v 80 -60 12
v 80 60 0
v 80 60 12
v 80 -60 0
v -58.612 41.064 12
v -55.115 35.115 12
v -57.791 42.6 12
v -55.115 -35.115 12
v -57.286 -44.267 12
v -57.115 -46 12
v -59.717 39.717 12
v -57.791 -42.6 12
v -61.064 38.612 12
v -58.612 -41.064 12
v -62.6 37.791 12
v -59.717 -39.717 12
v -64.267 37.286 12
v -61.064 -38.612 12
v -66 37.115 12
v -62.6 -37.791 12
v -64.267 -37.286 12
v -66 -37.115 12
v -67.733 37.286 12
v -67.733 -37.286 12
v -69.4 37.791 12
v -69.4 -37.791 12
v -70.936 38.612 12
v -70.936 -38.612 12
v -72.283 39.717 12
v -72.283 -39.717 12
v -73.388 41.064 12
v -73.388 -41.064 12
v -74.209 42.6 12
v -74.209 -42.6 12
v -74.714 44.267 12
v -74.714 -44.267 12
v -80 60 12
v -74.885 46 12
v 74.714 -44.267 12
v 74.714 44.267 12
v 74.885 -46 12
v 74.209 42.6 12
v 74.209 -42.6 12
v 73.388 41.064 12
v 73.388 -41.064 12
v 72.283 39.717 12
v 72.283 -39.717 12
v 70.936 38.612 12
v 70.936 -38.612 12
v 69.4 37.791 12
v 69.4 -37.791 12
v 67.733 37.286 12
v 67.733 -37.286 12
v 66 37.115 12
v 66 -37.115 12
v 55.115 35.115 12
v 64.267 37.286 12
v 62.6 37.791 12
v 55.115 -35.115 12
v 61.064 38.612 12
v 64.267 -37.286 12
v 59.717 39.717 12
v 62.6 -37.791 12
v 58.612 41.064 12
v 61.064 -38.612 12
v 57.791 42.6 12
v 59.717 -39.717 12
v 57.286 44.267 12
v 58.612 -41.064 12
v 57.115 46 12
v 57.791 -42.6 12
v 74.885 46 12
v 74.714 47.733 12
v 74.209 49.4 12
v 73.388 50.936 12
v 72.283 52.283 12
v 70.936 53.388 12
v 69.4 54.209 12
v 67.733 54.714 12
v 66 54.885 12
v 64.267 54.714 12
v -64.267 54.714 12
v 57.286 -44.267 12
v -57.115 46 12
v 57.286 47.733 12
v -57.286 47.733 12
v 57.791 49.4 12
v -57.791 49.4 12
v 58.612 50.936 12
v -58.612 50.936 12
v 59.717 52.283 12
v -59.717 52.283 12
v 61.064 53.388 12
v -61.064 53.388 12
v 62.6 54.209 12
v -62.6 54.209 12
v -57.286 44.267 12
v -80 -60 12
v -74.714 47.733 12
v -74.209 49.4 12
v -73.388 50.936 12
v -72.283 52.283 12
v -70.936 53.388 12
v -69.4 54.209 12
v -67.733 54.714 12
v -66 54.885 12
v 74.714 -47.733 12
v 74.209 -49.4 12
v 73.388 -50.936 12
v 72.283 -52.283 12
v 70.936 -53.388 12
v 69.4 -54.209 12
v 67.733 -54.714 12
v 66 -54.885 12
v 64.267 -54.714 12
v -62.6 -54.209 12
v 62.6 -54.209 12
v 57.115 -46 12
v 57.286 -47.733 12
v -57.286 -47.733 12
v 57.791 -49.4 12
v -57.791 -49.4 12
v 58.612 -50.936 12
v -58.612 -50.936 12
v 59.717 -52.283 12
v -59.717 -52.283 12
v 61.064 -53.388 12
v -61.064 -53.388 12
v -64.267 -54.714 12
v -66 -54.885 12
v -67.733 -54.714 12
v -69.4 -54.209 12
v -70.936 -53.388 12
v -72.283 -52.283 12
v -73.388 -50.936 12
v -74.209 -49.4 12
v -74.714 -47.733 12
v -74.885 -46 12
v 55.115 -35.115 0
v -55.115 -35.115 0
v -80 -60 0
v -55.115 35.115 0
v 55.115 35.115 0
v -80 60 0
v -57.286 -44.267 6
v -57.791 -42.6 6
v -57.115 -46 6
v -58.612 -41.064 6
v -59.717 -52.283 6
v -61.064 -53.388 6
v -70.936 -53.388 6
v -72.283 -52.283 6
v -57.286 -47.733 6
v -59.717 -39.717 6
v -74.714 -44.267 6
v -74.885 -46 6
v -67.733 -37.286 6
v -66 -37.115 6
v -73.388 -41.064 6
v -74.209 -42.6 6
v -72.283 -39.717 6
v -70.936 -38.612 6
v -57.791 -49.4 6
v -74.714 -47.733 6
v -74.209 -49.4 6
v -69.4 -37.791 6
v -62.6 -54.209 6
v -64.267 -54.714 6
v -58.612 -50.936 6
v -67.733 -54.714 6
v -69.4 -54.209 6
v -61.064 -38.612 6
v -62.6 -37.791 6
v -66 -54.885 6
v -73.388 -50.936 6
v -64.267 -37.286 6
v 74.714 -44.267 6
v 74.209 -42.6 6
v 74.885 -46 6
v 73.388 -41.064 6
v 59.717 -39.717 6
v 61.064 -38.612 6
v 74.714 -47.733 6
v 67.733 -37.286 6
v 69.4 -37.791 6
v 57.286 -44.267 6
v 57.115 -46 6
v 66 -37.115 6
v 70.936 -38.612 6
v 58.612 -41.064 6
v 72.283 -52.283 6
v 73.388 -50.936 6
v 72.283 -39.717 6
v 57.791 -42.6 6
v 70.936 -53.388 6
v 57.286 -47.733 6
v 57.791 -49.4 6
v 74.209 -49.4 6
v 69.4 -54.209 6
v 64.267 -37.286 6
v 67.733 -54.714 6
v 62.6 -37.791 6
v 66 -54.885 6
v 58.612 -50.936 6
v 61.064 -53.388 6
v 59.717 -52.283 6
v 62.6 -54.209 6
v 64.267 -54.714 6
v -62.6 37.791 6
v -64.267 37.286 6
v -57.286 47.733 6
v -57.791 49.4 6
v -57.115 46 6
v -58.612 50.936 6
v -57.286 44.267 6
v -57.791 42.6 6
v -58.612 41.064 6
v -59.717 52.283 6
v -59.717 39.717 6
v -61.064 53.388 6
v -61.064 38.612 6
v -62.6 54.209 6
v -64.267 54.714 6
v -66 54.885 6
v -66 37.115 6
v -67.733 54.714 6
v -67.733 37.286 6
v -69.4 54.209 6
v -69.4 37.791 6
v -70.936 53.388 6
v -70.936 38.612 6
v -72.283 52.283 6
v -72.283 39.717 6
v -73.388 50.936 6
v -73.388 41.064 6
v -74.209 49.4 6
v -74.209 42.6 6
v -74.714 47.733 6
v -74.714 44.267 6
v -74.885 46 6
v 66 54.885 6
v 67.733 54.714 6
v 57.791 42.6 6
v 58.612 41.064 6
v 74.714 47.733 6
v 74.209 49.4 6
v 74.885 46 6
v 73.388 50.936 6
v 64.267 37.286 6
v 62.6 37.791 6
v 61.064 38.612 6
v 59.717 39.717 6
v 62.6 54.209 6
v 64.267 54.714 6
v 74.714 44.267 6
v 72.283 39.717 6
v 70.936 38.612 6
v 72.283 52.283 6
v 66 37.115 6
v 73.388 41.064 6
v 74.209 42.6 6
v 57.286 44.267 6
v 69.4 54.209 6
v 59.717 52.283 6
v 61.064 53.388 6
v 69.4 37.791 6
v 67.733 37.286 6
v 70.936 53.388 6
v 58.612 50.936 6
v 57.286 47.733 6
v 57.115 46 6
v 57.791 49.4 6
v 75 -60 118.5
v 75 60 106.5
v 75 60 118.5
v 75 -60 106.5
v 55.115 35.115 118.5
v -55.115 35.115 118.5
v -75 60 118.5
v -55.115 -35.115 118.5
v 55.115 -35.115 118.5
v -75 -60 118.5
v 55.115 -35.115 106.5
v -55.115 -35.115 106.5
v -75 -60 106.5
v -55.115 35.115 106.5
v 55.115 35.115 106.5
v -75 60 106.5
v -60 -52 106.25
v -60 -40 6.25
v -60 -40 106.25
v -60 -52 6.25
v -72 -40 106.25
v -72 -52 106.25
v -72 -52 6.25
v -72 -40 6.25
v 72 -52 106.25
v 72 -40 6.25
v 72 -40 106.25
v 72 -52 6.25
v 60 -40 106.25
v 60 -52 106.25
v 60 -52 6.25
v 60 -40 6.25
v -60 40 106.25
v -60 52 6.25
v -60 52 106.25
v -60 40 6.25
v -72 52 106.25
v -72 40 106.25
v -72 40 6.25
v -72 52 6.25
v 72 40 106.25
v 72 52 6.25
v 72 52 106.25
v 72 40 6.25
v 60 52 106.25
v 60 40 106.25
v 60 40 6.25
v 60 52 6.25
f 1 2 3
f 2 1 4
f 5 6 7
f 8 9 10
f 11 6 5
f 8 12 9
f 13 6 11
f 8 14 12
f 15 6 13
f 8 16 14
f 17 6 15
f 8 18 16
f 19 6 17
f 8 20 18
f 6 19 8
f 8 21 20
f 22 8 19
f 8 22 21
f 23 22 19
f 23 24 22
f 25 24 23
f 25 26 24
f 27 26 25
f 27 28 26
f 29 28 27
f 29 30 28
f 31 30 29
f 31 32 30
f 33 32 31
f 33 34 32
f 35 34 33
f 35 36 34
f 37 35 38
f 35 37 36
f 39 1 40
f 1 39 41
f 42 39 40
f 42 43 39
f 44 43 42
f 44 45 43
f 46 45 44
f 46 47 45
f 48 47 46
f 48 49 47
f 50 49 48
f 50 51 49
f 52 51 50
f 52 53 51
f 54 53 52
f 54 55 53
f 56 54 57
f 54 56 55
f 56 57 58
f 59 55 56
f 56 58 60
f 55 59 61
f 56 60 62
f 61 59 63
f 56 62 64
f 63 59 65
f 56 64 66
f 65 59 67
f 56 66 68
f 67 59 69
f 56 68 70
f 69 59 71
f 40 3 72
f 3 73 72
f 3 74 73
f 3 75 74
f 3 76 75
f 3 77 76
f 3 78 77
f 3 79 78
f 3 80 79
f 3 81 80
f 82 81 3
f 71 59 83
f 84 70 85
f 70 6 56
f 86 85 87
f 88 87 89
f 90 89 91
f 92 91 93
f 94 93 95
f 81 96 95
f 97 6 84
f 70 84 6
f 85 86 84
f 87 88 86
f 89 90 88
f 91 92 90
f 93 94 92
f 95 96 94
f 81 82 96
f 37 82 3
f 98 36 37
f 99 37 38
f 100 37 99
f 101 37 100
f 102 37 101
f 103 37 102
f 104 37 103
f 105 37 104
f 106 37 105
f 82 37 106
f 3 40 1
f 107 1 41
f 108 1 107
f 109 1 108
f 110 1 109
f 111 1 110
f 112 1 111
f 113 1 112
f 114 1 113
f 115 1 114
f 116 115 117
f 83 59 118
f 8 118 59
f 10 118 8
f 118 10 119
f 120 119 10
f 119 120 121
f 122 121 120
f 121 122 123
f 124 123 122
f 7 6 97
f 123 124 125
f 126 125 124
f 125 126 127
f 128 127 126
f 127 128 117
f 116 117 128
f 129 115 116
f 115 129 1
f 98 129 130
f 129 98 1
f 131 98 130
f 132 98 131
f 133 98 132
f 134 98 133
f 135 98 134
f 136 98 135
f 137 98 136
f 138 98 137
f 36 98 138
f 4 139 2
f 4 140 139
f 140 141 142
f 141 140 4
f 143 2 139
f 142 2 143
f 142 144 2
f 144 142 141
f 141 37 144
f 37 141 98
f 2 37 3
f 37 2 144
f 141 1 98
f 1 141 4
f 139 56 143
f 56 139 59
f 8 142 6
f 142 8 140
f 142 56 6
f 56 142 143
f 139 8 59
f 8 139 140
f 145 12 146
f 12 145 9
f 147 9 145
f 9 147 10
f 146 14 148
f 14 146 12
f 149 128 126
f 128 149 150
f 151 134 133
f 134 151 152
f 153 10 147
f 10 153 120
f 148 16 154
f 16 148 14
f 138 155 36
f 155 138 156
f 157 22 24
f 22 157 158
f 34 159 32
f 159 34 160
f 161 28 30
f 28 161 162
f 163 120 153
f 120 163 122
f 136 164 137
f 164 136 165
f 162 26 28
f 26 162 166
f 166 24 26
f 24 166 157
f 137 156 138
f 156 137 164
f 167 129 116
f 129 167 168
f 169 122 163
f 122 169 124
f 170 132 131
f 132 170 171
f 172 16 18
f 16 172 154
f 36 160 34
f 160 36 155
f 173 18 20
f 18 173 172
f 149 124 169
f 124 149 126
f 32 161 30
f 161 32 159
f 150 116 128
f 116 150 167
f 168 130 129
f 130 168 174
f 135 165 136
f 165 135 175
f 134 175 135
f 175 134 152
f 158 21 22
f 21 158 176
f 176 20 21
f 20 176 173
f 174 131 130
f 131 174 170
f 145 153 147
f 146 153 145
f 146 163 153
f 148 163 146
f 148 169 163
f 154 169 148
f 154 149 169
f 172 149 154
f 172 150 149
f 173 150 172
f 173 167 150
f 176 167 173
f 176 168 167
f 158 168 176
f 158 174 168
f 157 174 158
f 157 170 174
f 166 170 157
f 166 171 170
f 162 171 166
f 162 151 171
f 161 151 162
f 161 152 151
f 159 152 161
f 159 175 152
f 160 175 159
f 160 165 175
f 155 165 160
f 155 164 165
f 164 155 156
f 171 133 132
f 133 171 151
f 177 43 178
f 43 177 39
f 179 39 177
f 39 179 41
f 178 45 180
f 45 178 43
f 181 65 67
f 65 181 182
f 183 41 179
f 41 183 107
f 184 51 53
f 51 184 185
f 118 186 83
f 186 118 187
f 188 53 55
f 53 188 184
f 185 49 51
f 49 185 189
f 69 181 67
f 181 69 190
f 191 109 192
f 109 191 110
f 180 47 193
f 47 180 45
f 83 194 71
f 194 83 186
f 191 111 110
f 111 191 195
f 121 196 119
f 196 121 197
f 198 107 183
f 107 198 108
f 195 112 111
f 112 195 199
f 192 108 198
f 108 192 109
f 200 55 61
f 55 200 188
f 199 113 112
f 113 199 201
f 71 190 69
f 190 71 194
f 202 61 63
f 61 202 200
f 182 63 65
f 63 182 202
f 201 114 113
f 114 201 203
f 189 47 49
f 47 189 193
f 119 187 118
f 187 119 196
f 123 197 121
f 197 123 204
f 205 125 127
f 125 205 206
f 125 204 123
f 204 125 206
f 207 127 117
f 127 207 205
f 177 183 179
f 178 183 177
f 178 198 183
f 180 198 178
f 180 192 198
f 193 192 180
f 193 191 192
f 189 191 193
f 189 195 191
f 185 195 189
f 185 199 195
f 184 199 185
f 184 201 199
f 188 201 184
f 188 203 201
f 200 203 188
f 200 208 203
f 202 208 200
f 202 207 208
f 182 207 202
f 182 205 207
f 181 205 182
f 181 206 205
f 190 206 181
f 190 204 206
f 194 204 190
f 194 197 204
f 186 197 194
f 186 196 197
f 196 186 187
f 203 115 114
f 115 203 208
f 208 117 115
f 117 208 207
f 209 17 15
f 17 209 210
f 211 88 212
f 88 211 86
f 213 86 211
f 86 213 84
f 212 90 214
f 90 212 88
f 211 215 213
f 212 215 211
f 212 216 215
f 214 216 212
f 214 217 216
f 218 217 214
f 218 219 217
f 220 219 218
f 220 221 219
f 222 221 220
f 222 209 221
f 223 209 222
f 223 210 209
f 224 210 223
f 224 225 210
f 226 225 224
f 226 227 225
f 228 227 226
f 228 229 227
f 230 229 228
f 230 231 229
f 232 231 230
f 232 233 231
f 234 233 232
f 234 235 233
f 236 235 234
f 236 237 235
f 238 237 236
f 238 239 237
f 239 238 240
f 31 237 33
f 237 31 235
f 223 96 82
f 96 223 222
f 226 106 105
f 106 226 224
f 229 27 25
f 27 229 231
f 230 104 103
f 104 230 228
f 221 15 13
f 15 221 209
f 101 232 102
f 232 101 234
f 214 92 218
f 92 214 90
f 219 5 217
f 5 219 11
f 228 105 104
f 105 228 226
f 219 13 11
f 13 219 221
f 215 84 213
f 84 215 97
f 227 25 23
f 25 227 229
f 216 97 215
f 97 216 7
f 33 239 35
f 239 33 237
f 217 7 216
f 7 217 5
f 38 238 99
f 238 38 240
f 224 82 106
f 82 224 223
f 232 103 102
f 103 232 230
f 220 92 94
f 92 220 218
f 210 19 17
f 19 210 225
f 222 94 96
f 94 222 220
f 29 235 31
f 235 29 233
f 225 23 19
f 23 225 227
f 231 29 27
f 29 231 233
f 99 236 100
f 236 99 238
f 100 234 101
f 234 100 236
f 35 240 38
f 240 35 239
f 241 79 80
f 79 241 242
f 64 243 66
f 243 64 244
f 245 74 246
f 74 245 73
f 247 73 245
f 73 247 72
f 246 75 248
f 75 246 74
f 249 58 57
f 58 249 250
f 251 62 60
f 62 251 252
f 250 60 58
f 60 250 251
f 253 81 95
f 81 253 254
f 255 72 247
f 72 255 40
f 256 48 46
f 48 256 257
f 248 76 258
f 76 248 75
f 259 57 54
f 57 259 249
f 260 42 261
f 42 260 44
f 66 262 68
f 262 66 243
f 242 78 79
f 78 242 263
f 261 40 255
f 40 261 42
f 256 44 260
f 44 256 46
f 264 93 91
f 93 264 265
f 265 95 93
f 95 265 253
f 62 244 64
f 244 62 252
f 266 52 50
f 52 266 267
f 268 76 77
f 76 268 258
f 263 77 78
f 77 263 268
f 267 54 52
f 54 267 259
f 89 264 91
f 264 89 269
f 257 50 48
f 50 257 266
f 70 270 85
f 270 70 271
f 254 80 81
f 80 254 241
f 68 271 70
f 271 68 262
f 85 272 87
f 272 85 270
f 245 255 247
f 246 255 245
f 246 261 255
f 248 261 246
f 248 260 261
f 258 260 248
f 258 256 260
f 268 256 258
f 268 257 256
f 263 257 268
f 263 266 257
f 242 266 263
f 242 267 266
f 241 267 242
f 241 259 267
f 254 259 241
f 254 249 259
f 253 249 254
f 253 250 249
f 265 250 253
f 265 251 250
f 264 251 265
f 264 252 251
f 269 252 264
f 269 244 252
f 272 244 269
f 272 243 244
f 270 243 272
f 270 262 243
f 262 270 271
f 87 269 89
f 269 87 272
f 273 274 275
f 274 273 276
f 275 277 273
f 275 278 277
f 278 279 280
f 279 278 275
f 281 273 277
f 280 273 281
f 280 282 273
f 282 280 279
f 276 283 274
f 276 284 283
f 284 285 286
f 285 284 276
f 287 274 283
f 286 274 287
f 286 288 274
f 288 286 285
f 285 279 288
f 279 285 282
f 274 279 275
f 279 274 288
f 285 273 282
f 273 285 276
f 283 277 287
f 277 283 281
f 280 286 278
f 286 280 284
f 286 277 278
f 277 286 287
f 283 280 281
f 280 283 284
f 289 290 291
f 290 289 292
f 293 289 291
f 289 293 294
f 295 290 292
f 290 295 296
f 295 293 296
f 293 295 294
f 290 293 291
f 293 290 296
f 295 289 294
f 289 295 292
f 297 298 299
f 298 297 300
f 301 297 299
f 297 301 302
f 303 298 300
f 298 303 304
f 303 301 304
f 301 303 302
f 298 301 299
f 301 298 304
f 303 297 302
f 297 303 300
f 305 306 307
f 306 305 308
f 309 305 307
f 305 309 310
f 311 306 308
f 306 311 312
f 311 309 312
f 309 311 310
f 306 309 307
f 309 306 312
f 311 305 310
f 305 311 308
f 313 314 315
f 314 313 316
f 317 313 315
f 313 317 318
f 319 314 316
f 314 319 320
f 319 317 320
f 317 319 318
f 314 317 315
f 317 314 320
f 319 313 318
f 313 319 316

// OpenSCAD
$fn = 32;

// ------------------------------------------------------------------------
// Frame cube: base 160 x 120 mm, posts 100 mm tall
// Every part is its own module, assembly() places every instance.
// ------------------------------------------------------------------------

// --- part 1 ---
module base_frame() {
  difference() {
    translate([-80, -60, 0]) cube([160, 120, 12]);
    translate([-55.115, -35.115, -1]) cube([110.23, 70.23, 14]);
    translate([-66, -46, 6]) cylinder(h = 7, d = 17.77);
    translate([66, -46, 6]) cylinder(h = 7, d = 17.77);
    translate([-66, 46, 6]) cylinder(h = 7, d = 17.77);
    translate([66, 46, 6]) cylinder(h = 7, d = 17.77);
  }
}

// --- part 2 ---
module corner_post() {
  translate([-6, -6, 0]) cube([12, 12, 100]);
}

// --- part 3 ---
module top_frame() {
  difference() {
    translate([-75, -60, 0]) cube([150, 120, 12]);
    translate([-55.115, -35.115, -1]) cube([110.23, 70.23, 14]);
  }
}

// --- assembly ---
module assembly() {
  color([0.80, 0.24, 0.20]) translate([0, 0, 0]) rotate([0, 0, 0]) base_frame();
  color([0.20, 0.45, 0.75]) translate([-66, -46, 6.25]) rotate([0, 0, 0]) corner_post();
  color([0.25, 0.62, 0.32]) translate([66, -46, 6.25]) rotate([0, 0, 0]) corner_post();
  color([0.92, 0.70, 0.18]) translate([-66, 46, 6.25]) rotate([0, 0, 0]) corner_post();
  color([0.58, 0.35, 0.70]) translate([66, 46, 6.25]) rotate([0, 0, 0]) corner_post();
  color([0.16, 0.66, 0.66]) translate([0, 0, 106.5]) rotate([0, 0, 0]) top_frame();
}

assembly();
